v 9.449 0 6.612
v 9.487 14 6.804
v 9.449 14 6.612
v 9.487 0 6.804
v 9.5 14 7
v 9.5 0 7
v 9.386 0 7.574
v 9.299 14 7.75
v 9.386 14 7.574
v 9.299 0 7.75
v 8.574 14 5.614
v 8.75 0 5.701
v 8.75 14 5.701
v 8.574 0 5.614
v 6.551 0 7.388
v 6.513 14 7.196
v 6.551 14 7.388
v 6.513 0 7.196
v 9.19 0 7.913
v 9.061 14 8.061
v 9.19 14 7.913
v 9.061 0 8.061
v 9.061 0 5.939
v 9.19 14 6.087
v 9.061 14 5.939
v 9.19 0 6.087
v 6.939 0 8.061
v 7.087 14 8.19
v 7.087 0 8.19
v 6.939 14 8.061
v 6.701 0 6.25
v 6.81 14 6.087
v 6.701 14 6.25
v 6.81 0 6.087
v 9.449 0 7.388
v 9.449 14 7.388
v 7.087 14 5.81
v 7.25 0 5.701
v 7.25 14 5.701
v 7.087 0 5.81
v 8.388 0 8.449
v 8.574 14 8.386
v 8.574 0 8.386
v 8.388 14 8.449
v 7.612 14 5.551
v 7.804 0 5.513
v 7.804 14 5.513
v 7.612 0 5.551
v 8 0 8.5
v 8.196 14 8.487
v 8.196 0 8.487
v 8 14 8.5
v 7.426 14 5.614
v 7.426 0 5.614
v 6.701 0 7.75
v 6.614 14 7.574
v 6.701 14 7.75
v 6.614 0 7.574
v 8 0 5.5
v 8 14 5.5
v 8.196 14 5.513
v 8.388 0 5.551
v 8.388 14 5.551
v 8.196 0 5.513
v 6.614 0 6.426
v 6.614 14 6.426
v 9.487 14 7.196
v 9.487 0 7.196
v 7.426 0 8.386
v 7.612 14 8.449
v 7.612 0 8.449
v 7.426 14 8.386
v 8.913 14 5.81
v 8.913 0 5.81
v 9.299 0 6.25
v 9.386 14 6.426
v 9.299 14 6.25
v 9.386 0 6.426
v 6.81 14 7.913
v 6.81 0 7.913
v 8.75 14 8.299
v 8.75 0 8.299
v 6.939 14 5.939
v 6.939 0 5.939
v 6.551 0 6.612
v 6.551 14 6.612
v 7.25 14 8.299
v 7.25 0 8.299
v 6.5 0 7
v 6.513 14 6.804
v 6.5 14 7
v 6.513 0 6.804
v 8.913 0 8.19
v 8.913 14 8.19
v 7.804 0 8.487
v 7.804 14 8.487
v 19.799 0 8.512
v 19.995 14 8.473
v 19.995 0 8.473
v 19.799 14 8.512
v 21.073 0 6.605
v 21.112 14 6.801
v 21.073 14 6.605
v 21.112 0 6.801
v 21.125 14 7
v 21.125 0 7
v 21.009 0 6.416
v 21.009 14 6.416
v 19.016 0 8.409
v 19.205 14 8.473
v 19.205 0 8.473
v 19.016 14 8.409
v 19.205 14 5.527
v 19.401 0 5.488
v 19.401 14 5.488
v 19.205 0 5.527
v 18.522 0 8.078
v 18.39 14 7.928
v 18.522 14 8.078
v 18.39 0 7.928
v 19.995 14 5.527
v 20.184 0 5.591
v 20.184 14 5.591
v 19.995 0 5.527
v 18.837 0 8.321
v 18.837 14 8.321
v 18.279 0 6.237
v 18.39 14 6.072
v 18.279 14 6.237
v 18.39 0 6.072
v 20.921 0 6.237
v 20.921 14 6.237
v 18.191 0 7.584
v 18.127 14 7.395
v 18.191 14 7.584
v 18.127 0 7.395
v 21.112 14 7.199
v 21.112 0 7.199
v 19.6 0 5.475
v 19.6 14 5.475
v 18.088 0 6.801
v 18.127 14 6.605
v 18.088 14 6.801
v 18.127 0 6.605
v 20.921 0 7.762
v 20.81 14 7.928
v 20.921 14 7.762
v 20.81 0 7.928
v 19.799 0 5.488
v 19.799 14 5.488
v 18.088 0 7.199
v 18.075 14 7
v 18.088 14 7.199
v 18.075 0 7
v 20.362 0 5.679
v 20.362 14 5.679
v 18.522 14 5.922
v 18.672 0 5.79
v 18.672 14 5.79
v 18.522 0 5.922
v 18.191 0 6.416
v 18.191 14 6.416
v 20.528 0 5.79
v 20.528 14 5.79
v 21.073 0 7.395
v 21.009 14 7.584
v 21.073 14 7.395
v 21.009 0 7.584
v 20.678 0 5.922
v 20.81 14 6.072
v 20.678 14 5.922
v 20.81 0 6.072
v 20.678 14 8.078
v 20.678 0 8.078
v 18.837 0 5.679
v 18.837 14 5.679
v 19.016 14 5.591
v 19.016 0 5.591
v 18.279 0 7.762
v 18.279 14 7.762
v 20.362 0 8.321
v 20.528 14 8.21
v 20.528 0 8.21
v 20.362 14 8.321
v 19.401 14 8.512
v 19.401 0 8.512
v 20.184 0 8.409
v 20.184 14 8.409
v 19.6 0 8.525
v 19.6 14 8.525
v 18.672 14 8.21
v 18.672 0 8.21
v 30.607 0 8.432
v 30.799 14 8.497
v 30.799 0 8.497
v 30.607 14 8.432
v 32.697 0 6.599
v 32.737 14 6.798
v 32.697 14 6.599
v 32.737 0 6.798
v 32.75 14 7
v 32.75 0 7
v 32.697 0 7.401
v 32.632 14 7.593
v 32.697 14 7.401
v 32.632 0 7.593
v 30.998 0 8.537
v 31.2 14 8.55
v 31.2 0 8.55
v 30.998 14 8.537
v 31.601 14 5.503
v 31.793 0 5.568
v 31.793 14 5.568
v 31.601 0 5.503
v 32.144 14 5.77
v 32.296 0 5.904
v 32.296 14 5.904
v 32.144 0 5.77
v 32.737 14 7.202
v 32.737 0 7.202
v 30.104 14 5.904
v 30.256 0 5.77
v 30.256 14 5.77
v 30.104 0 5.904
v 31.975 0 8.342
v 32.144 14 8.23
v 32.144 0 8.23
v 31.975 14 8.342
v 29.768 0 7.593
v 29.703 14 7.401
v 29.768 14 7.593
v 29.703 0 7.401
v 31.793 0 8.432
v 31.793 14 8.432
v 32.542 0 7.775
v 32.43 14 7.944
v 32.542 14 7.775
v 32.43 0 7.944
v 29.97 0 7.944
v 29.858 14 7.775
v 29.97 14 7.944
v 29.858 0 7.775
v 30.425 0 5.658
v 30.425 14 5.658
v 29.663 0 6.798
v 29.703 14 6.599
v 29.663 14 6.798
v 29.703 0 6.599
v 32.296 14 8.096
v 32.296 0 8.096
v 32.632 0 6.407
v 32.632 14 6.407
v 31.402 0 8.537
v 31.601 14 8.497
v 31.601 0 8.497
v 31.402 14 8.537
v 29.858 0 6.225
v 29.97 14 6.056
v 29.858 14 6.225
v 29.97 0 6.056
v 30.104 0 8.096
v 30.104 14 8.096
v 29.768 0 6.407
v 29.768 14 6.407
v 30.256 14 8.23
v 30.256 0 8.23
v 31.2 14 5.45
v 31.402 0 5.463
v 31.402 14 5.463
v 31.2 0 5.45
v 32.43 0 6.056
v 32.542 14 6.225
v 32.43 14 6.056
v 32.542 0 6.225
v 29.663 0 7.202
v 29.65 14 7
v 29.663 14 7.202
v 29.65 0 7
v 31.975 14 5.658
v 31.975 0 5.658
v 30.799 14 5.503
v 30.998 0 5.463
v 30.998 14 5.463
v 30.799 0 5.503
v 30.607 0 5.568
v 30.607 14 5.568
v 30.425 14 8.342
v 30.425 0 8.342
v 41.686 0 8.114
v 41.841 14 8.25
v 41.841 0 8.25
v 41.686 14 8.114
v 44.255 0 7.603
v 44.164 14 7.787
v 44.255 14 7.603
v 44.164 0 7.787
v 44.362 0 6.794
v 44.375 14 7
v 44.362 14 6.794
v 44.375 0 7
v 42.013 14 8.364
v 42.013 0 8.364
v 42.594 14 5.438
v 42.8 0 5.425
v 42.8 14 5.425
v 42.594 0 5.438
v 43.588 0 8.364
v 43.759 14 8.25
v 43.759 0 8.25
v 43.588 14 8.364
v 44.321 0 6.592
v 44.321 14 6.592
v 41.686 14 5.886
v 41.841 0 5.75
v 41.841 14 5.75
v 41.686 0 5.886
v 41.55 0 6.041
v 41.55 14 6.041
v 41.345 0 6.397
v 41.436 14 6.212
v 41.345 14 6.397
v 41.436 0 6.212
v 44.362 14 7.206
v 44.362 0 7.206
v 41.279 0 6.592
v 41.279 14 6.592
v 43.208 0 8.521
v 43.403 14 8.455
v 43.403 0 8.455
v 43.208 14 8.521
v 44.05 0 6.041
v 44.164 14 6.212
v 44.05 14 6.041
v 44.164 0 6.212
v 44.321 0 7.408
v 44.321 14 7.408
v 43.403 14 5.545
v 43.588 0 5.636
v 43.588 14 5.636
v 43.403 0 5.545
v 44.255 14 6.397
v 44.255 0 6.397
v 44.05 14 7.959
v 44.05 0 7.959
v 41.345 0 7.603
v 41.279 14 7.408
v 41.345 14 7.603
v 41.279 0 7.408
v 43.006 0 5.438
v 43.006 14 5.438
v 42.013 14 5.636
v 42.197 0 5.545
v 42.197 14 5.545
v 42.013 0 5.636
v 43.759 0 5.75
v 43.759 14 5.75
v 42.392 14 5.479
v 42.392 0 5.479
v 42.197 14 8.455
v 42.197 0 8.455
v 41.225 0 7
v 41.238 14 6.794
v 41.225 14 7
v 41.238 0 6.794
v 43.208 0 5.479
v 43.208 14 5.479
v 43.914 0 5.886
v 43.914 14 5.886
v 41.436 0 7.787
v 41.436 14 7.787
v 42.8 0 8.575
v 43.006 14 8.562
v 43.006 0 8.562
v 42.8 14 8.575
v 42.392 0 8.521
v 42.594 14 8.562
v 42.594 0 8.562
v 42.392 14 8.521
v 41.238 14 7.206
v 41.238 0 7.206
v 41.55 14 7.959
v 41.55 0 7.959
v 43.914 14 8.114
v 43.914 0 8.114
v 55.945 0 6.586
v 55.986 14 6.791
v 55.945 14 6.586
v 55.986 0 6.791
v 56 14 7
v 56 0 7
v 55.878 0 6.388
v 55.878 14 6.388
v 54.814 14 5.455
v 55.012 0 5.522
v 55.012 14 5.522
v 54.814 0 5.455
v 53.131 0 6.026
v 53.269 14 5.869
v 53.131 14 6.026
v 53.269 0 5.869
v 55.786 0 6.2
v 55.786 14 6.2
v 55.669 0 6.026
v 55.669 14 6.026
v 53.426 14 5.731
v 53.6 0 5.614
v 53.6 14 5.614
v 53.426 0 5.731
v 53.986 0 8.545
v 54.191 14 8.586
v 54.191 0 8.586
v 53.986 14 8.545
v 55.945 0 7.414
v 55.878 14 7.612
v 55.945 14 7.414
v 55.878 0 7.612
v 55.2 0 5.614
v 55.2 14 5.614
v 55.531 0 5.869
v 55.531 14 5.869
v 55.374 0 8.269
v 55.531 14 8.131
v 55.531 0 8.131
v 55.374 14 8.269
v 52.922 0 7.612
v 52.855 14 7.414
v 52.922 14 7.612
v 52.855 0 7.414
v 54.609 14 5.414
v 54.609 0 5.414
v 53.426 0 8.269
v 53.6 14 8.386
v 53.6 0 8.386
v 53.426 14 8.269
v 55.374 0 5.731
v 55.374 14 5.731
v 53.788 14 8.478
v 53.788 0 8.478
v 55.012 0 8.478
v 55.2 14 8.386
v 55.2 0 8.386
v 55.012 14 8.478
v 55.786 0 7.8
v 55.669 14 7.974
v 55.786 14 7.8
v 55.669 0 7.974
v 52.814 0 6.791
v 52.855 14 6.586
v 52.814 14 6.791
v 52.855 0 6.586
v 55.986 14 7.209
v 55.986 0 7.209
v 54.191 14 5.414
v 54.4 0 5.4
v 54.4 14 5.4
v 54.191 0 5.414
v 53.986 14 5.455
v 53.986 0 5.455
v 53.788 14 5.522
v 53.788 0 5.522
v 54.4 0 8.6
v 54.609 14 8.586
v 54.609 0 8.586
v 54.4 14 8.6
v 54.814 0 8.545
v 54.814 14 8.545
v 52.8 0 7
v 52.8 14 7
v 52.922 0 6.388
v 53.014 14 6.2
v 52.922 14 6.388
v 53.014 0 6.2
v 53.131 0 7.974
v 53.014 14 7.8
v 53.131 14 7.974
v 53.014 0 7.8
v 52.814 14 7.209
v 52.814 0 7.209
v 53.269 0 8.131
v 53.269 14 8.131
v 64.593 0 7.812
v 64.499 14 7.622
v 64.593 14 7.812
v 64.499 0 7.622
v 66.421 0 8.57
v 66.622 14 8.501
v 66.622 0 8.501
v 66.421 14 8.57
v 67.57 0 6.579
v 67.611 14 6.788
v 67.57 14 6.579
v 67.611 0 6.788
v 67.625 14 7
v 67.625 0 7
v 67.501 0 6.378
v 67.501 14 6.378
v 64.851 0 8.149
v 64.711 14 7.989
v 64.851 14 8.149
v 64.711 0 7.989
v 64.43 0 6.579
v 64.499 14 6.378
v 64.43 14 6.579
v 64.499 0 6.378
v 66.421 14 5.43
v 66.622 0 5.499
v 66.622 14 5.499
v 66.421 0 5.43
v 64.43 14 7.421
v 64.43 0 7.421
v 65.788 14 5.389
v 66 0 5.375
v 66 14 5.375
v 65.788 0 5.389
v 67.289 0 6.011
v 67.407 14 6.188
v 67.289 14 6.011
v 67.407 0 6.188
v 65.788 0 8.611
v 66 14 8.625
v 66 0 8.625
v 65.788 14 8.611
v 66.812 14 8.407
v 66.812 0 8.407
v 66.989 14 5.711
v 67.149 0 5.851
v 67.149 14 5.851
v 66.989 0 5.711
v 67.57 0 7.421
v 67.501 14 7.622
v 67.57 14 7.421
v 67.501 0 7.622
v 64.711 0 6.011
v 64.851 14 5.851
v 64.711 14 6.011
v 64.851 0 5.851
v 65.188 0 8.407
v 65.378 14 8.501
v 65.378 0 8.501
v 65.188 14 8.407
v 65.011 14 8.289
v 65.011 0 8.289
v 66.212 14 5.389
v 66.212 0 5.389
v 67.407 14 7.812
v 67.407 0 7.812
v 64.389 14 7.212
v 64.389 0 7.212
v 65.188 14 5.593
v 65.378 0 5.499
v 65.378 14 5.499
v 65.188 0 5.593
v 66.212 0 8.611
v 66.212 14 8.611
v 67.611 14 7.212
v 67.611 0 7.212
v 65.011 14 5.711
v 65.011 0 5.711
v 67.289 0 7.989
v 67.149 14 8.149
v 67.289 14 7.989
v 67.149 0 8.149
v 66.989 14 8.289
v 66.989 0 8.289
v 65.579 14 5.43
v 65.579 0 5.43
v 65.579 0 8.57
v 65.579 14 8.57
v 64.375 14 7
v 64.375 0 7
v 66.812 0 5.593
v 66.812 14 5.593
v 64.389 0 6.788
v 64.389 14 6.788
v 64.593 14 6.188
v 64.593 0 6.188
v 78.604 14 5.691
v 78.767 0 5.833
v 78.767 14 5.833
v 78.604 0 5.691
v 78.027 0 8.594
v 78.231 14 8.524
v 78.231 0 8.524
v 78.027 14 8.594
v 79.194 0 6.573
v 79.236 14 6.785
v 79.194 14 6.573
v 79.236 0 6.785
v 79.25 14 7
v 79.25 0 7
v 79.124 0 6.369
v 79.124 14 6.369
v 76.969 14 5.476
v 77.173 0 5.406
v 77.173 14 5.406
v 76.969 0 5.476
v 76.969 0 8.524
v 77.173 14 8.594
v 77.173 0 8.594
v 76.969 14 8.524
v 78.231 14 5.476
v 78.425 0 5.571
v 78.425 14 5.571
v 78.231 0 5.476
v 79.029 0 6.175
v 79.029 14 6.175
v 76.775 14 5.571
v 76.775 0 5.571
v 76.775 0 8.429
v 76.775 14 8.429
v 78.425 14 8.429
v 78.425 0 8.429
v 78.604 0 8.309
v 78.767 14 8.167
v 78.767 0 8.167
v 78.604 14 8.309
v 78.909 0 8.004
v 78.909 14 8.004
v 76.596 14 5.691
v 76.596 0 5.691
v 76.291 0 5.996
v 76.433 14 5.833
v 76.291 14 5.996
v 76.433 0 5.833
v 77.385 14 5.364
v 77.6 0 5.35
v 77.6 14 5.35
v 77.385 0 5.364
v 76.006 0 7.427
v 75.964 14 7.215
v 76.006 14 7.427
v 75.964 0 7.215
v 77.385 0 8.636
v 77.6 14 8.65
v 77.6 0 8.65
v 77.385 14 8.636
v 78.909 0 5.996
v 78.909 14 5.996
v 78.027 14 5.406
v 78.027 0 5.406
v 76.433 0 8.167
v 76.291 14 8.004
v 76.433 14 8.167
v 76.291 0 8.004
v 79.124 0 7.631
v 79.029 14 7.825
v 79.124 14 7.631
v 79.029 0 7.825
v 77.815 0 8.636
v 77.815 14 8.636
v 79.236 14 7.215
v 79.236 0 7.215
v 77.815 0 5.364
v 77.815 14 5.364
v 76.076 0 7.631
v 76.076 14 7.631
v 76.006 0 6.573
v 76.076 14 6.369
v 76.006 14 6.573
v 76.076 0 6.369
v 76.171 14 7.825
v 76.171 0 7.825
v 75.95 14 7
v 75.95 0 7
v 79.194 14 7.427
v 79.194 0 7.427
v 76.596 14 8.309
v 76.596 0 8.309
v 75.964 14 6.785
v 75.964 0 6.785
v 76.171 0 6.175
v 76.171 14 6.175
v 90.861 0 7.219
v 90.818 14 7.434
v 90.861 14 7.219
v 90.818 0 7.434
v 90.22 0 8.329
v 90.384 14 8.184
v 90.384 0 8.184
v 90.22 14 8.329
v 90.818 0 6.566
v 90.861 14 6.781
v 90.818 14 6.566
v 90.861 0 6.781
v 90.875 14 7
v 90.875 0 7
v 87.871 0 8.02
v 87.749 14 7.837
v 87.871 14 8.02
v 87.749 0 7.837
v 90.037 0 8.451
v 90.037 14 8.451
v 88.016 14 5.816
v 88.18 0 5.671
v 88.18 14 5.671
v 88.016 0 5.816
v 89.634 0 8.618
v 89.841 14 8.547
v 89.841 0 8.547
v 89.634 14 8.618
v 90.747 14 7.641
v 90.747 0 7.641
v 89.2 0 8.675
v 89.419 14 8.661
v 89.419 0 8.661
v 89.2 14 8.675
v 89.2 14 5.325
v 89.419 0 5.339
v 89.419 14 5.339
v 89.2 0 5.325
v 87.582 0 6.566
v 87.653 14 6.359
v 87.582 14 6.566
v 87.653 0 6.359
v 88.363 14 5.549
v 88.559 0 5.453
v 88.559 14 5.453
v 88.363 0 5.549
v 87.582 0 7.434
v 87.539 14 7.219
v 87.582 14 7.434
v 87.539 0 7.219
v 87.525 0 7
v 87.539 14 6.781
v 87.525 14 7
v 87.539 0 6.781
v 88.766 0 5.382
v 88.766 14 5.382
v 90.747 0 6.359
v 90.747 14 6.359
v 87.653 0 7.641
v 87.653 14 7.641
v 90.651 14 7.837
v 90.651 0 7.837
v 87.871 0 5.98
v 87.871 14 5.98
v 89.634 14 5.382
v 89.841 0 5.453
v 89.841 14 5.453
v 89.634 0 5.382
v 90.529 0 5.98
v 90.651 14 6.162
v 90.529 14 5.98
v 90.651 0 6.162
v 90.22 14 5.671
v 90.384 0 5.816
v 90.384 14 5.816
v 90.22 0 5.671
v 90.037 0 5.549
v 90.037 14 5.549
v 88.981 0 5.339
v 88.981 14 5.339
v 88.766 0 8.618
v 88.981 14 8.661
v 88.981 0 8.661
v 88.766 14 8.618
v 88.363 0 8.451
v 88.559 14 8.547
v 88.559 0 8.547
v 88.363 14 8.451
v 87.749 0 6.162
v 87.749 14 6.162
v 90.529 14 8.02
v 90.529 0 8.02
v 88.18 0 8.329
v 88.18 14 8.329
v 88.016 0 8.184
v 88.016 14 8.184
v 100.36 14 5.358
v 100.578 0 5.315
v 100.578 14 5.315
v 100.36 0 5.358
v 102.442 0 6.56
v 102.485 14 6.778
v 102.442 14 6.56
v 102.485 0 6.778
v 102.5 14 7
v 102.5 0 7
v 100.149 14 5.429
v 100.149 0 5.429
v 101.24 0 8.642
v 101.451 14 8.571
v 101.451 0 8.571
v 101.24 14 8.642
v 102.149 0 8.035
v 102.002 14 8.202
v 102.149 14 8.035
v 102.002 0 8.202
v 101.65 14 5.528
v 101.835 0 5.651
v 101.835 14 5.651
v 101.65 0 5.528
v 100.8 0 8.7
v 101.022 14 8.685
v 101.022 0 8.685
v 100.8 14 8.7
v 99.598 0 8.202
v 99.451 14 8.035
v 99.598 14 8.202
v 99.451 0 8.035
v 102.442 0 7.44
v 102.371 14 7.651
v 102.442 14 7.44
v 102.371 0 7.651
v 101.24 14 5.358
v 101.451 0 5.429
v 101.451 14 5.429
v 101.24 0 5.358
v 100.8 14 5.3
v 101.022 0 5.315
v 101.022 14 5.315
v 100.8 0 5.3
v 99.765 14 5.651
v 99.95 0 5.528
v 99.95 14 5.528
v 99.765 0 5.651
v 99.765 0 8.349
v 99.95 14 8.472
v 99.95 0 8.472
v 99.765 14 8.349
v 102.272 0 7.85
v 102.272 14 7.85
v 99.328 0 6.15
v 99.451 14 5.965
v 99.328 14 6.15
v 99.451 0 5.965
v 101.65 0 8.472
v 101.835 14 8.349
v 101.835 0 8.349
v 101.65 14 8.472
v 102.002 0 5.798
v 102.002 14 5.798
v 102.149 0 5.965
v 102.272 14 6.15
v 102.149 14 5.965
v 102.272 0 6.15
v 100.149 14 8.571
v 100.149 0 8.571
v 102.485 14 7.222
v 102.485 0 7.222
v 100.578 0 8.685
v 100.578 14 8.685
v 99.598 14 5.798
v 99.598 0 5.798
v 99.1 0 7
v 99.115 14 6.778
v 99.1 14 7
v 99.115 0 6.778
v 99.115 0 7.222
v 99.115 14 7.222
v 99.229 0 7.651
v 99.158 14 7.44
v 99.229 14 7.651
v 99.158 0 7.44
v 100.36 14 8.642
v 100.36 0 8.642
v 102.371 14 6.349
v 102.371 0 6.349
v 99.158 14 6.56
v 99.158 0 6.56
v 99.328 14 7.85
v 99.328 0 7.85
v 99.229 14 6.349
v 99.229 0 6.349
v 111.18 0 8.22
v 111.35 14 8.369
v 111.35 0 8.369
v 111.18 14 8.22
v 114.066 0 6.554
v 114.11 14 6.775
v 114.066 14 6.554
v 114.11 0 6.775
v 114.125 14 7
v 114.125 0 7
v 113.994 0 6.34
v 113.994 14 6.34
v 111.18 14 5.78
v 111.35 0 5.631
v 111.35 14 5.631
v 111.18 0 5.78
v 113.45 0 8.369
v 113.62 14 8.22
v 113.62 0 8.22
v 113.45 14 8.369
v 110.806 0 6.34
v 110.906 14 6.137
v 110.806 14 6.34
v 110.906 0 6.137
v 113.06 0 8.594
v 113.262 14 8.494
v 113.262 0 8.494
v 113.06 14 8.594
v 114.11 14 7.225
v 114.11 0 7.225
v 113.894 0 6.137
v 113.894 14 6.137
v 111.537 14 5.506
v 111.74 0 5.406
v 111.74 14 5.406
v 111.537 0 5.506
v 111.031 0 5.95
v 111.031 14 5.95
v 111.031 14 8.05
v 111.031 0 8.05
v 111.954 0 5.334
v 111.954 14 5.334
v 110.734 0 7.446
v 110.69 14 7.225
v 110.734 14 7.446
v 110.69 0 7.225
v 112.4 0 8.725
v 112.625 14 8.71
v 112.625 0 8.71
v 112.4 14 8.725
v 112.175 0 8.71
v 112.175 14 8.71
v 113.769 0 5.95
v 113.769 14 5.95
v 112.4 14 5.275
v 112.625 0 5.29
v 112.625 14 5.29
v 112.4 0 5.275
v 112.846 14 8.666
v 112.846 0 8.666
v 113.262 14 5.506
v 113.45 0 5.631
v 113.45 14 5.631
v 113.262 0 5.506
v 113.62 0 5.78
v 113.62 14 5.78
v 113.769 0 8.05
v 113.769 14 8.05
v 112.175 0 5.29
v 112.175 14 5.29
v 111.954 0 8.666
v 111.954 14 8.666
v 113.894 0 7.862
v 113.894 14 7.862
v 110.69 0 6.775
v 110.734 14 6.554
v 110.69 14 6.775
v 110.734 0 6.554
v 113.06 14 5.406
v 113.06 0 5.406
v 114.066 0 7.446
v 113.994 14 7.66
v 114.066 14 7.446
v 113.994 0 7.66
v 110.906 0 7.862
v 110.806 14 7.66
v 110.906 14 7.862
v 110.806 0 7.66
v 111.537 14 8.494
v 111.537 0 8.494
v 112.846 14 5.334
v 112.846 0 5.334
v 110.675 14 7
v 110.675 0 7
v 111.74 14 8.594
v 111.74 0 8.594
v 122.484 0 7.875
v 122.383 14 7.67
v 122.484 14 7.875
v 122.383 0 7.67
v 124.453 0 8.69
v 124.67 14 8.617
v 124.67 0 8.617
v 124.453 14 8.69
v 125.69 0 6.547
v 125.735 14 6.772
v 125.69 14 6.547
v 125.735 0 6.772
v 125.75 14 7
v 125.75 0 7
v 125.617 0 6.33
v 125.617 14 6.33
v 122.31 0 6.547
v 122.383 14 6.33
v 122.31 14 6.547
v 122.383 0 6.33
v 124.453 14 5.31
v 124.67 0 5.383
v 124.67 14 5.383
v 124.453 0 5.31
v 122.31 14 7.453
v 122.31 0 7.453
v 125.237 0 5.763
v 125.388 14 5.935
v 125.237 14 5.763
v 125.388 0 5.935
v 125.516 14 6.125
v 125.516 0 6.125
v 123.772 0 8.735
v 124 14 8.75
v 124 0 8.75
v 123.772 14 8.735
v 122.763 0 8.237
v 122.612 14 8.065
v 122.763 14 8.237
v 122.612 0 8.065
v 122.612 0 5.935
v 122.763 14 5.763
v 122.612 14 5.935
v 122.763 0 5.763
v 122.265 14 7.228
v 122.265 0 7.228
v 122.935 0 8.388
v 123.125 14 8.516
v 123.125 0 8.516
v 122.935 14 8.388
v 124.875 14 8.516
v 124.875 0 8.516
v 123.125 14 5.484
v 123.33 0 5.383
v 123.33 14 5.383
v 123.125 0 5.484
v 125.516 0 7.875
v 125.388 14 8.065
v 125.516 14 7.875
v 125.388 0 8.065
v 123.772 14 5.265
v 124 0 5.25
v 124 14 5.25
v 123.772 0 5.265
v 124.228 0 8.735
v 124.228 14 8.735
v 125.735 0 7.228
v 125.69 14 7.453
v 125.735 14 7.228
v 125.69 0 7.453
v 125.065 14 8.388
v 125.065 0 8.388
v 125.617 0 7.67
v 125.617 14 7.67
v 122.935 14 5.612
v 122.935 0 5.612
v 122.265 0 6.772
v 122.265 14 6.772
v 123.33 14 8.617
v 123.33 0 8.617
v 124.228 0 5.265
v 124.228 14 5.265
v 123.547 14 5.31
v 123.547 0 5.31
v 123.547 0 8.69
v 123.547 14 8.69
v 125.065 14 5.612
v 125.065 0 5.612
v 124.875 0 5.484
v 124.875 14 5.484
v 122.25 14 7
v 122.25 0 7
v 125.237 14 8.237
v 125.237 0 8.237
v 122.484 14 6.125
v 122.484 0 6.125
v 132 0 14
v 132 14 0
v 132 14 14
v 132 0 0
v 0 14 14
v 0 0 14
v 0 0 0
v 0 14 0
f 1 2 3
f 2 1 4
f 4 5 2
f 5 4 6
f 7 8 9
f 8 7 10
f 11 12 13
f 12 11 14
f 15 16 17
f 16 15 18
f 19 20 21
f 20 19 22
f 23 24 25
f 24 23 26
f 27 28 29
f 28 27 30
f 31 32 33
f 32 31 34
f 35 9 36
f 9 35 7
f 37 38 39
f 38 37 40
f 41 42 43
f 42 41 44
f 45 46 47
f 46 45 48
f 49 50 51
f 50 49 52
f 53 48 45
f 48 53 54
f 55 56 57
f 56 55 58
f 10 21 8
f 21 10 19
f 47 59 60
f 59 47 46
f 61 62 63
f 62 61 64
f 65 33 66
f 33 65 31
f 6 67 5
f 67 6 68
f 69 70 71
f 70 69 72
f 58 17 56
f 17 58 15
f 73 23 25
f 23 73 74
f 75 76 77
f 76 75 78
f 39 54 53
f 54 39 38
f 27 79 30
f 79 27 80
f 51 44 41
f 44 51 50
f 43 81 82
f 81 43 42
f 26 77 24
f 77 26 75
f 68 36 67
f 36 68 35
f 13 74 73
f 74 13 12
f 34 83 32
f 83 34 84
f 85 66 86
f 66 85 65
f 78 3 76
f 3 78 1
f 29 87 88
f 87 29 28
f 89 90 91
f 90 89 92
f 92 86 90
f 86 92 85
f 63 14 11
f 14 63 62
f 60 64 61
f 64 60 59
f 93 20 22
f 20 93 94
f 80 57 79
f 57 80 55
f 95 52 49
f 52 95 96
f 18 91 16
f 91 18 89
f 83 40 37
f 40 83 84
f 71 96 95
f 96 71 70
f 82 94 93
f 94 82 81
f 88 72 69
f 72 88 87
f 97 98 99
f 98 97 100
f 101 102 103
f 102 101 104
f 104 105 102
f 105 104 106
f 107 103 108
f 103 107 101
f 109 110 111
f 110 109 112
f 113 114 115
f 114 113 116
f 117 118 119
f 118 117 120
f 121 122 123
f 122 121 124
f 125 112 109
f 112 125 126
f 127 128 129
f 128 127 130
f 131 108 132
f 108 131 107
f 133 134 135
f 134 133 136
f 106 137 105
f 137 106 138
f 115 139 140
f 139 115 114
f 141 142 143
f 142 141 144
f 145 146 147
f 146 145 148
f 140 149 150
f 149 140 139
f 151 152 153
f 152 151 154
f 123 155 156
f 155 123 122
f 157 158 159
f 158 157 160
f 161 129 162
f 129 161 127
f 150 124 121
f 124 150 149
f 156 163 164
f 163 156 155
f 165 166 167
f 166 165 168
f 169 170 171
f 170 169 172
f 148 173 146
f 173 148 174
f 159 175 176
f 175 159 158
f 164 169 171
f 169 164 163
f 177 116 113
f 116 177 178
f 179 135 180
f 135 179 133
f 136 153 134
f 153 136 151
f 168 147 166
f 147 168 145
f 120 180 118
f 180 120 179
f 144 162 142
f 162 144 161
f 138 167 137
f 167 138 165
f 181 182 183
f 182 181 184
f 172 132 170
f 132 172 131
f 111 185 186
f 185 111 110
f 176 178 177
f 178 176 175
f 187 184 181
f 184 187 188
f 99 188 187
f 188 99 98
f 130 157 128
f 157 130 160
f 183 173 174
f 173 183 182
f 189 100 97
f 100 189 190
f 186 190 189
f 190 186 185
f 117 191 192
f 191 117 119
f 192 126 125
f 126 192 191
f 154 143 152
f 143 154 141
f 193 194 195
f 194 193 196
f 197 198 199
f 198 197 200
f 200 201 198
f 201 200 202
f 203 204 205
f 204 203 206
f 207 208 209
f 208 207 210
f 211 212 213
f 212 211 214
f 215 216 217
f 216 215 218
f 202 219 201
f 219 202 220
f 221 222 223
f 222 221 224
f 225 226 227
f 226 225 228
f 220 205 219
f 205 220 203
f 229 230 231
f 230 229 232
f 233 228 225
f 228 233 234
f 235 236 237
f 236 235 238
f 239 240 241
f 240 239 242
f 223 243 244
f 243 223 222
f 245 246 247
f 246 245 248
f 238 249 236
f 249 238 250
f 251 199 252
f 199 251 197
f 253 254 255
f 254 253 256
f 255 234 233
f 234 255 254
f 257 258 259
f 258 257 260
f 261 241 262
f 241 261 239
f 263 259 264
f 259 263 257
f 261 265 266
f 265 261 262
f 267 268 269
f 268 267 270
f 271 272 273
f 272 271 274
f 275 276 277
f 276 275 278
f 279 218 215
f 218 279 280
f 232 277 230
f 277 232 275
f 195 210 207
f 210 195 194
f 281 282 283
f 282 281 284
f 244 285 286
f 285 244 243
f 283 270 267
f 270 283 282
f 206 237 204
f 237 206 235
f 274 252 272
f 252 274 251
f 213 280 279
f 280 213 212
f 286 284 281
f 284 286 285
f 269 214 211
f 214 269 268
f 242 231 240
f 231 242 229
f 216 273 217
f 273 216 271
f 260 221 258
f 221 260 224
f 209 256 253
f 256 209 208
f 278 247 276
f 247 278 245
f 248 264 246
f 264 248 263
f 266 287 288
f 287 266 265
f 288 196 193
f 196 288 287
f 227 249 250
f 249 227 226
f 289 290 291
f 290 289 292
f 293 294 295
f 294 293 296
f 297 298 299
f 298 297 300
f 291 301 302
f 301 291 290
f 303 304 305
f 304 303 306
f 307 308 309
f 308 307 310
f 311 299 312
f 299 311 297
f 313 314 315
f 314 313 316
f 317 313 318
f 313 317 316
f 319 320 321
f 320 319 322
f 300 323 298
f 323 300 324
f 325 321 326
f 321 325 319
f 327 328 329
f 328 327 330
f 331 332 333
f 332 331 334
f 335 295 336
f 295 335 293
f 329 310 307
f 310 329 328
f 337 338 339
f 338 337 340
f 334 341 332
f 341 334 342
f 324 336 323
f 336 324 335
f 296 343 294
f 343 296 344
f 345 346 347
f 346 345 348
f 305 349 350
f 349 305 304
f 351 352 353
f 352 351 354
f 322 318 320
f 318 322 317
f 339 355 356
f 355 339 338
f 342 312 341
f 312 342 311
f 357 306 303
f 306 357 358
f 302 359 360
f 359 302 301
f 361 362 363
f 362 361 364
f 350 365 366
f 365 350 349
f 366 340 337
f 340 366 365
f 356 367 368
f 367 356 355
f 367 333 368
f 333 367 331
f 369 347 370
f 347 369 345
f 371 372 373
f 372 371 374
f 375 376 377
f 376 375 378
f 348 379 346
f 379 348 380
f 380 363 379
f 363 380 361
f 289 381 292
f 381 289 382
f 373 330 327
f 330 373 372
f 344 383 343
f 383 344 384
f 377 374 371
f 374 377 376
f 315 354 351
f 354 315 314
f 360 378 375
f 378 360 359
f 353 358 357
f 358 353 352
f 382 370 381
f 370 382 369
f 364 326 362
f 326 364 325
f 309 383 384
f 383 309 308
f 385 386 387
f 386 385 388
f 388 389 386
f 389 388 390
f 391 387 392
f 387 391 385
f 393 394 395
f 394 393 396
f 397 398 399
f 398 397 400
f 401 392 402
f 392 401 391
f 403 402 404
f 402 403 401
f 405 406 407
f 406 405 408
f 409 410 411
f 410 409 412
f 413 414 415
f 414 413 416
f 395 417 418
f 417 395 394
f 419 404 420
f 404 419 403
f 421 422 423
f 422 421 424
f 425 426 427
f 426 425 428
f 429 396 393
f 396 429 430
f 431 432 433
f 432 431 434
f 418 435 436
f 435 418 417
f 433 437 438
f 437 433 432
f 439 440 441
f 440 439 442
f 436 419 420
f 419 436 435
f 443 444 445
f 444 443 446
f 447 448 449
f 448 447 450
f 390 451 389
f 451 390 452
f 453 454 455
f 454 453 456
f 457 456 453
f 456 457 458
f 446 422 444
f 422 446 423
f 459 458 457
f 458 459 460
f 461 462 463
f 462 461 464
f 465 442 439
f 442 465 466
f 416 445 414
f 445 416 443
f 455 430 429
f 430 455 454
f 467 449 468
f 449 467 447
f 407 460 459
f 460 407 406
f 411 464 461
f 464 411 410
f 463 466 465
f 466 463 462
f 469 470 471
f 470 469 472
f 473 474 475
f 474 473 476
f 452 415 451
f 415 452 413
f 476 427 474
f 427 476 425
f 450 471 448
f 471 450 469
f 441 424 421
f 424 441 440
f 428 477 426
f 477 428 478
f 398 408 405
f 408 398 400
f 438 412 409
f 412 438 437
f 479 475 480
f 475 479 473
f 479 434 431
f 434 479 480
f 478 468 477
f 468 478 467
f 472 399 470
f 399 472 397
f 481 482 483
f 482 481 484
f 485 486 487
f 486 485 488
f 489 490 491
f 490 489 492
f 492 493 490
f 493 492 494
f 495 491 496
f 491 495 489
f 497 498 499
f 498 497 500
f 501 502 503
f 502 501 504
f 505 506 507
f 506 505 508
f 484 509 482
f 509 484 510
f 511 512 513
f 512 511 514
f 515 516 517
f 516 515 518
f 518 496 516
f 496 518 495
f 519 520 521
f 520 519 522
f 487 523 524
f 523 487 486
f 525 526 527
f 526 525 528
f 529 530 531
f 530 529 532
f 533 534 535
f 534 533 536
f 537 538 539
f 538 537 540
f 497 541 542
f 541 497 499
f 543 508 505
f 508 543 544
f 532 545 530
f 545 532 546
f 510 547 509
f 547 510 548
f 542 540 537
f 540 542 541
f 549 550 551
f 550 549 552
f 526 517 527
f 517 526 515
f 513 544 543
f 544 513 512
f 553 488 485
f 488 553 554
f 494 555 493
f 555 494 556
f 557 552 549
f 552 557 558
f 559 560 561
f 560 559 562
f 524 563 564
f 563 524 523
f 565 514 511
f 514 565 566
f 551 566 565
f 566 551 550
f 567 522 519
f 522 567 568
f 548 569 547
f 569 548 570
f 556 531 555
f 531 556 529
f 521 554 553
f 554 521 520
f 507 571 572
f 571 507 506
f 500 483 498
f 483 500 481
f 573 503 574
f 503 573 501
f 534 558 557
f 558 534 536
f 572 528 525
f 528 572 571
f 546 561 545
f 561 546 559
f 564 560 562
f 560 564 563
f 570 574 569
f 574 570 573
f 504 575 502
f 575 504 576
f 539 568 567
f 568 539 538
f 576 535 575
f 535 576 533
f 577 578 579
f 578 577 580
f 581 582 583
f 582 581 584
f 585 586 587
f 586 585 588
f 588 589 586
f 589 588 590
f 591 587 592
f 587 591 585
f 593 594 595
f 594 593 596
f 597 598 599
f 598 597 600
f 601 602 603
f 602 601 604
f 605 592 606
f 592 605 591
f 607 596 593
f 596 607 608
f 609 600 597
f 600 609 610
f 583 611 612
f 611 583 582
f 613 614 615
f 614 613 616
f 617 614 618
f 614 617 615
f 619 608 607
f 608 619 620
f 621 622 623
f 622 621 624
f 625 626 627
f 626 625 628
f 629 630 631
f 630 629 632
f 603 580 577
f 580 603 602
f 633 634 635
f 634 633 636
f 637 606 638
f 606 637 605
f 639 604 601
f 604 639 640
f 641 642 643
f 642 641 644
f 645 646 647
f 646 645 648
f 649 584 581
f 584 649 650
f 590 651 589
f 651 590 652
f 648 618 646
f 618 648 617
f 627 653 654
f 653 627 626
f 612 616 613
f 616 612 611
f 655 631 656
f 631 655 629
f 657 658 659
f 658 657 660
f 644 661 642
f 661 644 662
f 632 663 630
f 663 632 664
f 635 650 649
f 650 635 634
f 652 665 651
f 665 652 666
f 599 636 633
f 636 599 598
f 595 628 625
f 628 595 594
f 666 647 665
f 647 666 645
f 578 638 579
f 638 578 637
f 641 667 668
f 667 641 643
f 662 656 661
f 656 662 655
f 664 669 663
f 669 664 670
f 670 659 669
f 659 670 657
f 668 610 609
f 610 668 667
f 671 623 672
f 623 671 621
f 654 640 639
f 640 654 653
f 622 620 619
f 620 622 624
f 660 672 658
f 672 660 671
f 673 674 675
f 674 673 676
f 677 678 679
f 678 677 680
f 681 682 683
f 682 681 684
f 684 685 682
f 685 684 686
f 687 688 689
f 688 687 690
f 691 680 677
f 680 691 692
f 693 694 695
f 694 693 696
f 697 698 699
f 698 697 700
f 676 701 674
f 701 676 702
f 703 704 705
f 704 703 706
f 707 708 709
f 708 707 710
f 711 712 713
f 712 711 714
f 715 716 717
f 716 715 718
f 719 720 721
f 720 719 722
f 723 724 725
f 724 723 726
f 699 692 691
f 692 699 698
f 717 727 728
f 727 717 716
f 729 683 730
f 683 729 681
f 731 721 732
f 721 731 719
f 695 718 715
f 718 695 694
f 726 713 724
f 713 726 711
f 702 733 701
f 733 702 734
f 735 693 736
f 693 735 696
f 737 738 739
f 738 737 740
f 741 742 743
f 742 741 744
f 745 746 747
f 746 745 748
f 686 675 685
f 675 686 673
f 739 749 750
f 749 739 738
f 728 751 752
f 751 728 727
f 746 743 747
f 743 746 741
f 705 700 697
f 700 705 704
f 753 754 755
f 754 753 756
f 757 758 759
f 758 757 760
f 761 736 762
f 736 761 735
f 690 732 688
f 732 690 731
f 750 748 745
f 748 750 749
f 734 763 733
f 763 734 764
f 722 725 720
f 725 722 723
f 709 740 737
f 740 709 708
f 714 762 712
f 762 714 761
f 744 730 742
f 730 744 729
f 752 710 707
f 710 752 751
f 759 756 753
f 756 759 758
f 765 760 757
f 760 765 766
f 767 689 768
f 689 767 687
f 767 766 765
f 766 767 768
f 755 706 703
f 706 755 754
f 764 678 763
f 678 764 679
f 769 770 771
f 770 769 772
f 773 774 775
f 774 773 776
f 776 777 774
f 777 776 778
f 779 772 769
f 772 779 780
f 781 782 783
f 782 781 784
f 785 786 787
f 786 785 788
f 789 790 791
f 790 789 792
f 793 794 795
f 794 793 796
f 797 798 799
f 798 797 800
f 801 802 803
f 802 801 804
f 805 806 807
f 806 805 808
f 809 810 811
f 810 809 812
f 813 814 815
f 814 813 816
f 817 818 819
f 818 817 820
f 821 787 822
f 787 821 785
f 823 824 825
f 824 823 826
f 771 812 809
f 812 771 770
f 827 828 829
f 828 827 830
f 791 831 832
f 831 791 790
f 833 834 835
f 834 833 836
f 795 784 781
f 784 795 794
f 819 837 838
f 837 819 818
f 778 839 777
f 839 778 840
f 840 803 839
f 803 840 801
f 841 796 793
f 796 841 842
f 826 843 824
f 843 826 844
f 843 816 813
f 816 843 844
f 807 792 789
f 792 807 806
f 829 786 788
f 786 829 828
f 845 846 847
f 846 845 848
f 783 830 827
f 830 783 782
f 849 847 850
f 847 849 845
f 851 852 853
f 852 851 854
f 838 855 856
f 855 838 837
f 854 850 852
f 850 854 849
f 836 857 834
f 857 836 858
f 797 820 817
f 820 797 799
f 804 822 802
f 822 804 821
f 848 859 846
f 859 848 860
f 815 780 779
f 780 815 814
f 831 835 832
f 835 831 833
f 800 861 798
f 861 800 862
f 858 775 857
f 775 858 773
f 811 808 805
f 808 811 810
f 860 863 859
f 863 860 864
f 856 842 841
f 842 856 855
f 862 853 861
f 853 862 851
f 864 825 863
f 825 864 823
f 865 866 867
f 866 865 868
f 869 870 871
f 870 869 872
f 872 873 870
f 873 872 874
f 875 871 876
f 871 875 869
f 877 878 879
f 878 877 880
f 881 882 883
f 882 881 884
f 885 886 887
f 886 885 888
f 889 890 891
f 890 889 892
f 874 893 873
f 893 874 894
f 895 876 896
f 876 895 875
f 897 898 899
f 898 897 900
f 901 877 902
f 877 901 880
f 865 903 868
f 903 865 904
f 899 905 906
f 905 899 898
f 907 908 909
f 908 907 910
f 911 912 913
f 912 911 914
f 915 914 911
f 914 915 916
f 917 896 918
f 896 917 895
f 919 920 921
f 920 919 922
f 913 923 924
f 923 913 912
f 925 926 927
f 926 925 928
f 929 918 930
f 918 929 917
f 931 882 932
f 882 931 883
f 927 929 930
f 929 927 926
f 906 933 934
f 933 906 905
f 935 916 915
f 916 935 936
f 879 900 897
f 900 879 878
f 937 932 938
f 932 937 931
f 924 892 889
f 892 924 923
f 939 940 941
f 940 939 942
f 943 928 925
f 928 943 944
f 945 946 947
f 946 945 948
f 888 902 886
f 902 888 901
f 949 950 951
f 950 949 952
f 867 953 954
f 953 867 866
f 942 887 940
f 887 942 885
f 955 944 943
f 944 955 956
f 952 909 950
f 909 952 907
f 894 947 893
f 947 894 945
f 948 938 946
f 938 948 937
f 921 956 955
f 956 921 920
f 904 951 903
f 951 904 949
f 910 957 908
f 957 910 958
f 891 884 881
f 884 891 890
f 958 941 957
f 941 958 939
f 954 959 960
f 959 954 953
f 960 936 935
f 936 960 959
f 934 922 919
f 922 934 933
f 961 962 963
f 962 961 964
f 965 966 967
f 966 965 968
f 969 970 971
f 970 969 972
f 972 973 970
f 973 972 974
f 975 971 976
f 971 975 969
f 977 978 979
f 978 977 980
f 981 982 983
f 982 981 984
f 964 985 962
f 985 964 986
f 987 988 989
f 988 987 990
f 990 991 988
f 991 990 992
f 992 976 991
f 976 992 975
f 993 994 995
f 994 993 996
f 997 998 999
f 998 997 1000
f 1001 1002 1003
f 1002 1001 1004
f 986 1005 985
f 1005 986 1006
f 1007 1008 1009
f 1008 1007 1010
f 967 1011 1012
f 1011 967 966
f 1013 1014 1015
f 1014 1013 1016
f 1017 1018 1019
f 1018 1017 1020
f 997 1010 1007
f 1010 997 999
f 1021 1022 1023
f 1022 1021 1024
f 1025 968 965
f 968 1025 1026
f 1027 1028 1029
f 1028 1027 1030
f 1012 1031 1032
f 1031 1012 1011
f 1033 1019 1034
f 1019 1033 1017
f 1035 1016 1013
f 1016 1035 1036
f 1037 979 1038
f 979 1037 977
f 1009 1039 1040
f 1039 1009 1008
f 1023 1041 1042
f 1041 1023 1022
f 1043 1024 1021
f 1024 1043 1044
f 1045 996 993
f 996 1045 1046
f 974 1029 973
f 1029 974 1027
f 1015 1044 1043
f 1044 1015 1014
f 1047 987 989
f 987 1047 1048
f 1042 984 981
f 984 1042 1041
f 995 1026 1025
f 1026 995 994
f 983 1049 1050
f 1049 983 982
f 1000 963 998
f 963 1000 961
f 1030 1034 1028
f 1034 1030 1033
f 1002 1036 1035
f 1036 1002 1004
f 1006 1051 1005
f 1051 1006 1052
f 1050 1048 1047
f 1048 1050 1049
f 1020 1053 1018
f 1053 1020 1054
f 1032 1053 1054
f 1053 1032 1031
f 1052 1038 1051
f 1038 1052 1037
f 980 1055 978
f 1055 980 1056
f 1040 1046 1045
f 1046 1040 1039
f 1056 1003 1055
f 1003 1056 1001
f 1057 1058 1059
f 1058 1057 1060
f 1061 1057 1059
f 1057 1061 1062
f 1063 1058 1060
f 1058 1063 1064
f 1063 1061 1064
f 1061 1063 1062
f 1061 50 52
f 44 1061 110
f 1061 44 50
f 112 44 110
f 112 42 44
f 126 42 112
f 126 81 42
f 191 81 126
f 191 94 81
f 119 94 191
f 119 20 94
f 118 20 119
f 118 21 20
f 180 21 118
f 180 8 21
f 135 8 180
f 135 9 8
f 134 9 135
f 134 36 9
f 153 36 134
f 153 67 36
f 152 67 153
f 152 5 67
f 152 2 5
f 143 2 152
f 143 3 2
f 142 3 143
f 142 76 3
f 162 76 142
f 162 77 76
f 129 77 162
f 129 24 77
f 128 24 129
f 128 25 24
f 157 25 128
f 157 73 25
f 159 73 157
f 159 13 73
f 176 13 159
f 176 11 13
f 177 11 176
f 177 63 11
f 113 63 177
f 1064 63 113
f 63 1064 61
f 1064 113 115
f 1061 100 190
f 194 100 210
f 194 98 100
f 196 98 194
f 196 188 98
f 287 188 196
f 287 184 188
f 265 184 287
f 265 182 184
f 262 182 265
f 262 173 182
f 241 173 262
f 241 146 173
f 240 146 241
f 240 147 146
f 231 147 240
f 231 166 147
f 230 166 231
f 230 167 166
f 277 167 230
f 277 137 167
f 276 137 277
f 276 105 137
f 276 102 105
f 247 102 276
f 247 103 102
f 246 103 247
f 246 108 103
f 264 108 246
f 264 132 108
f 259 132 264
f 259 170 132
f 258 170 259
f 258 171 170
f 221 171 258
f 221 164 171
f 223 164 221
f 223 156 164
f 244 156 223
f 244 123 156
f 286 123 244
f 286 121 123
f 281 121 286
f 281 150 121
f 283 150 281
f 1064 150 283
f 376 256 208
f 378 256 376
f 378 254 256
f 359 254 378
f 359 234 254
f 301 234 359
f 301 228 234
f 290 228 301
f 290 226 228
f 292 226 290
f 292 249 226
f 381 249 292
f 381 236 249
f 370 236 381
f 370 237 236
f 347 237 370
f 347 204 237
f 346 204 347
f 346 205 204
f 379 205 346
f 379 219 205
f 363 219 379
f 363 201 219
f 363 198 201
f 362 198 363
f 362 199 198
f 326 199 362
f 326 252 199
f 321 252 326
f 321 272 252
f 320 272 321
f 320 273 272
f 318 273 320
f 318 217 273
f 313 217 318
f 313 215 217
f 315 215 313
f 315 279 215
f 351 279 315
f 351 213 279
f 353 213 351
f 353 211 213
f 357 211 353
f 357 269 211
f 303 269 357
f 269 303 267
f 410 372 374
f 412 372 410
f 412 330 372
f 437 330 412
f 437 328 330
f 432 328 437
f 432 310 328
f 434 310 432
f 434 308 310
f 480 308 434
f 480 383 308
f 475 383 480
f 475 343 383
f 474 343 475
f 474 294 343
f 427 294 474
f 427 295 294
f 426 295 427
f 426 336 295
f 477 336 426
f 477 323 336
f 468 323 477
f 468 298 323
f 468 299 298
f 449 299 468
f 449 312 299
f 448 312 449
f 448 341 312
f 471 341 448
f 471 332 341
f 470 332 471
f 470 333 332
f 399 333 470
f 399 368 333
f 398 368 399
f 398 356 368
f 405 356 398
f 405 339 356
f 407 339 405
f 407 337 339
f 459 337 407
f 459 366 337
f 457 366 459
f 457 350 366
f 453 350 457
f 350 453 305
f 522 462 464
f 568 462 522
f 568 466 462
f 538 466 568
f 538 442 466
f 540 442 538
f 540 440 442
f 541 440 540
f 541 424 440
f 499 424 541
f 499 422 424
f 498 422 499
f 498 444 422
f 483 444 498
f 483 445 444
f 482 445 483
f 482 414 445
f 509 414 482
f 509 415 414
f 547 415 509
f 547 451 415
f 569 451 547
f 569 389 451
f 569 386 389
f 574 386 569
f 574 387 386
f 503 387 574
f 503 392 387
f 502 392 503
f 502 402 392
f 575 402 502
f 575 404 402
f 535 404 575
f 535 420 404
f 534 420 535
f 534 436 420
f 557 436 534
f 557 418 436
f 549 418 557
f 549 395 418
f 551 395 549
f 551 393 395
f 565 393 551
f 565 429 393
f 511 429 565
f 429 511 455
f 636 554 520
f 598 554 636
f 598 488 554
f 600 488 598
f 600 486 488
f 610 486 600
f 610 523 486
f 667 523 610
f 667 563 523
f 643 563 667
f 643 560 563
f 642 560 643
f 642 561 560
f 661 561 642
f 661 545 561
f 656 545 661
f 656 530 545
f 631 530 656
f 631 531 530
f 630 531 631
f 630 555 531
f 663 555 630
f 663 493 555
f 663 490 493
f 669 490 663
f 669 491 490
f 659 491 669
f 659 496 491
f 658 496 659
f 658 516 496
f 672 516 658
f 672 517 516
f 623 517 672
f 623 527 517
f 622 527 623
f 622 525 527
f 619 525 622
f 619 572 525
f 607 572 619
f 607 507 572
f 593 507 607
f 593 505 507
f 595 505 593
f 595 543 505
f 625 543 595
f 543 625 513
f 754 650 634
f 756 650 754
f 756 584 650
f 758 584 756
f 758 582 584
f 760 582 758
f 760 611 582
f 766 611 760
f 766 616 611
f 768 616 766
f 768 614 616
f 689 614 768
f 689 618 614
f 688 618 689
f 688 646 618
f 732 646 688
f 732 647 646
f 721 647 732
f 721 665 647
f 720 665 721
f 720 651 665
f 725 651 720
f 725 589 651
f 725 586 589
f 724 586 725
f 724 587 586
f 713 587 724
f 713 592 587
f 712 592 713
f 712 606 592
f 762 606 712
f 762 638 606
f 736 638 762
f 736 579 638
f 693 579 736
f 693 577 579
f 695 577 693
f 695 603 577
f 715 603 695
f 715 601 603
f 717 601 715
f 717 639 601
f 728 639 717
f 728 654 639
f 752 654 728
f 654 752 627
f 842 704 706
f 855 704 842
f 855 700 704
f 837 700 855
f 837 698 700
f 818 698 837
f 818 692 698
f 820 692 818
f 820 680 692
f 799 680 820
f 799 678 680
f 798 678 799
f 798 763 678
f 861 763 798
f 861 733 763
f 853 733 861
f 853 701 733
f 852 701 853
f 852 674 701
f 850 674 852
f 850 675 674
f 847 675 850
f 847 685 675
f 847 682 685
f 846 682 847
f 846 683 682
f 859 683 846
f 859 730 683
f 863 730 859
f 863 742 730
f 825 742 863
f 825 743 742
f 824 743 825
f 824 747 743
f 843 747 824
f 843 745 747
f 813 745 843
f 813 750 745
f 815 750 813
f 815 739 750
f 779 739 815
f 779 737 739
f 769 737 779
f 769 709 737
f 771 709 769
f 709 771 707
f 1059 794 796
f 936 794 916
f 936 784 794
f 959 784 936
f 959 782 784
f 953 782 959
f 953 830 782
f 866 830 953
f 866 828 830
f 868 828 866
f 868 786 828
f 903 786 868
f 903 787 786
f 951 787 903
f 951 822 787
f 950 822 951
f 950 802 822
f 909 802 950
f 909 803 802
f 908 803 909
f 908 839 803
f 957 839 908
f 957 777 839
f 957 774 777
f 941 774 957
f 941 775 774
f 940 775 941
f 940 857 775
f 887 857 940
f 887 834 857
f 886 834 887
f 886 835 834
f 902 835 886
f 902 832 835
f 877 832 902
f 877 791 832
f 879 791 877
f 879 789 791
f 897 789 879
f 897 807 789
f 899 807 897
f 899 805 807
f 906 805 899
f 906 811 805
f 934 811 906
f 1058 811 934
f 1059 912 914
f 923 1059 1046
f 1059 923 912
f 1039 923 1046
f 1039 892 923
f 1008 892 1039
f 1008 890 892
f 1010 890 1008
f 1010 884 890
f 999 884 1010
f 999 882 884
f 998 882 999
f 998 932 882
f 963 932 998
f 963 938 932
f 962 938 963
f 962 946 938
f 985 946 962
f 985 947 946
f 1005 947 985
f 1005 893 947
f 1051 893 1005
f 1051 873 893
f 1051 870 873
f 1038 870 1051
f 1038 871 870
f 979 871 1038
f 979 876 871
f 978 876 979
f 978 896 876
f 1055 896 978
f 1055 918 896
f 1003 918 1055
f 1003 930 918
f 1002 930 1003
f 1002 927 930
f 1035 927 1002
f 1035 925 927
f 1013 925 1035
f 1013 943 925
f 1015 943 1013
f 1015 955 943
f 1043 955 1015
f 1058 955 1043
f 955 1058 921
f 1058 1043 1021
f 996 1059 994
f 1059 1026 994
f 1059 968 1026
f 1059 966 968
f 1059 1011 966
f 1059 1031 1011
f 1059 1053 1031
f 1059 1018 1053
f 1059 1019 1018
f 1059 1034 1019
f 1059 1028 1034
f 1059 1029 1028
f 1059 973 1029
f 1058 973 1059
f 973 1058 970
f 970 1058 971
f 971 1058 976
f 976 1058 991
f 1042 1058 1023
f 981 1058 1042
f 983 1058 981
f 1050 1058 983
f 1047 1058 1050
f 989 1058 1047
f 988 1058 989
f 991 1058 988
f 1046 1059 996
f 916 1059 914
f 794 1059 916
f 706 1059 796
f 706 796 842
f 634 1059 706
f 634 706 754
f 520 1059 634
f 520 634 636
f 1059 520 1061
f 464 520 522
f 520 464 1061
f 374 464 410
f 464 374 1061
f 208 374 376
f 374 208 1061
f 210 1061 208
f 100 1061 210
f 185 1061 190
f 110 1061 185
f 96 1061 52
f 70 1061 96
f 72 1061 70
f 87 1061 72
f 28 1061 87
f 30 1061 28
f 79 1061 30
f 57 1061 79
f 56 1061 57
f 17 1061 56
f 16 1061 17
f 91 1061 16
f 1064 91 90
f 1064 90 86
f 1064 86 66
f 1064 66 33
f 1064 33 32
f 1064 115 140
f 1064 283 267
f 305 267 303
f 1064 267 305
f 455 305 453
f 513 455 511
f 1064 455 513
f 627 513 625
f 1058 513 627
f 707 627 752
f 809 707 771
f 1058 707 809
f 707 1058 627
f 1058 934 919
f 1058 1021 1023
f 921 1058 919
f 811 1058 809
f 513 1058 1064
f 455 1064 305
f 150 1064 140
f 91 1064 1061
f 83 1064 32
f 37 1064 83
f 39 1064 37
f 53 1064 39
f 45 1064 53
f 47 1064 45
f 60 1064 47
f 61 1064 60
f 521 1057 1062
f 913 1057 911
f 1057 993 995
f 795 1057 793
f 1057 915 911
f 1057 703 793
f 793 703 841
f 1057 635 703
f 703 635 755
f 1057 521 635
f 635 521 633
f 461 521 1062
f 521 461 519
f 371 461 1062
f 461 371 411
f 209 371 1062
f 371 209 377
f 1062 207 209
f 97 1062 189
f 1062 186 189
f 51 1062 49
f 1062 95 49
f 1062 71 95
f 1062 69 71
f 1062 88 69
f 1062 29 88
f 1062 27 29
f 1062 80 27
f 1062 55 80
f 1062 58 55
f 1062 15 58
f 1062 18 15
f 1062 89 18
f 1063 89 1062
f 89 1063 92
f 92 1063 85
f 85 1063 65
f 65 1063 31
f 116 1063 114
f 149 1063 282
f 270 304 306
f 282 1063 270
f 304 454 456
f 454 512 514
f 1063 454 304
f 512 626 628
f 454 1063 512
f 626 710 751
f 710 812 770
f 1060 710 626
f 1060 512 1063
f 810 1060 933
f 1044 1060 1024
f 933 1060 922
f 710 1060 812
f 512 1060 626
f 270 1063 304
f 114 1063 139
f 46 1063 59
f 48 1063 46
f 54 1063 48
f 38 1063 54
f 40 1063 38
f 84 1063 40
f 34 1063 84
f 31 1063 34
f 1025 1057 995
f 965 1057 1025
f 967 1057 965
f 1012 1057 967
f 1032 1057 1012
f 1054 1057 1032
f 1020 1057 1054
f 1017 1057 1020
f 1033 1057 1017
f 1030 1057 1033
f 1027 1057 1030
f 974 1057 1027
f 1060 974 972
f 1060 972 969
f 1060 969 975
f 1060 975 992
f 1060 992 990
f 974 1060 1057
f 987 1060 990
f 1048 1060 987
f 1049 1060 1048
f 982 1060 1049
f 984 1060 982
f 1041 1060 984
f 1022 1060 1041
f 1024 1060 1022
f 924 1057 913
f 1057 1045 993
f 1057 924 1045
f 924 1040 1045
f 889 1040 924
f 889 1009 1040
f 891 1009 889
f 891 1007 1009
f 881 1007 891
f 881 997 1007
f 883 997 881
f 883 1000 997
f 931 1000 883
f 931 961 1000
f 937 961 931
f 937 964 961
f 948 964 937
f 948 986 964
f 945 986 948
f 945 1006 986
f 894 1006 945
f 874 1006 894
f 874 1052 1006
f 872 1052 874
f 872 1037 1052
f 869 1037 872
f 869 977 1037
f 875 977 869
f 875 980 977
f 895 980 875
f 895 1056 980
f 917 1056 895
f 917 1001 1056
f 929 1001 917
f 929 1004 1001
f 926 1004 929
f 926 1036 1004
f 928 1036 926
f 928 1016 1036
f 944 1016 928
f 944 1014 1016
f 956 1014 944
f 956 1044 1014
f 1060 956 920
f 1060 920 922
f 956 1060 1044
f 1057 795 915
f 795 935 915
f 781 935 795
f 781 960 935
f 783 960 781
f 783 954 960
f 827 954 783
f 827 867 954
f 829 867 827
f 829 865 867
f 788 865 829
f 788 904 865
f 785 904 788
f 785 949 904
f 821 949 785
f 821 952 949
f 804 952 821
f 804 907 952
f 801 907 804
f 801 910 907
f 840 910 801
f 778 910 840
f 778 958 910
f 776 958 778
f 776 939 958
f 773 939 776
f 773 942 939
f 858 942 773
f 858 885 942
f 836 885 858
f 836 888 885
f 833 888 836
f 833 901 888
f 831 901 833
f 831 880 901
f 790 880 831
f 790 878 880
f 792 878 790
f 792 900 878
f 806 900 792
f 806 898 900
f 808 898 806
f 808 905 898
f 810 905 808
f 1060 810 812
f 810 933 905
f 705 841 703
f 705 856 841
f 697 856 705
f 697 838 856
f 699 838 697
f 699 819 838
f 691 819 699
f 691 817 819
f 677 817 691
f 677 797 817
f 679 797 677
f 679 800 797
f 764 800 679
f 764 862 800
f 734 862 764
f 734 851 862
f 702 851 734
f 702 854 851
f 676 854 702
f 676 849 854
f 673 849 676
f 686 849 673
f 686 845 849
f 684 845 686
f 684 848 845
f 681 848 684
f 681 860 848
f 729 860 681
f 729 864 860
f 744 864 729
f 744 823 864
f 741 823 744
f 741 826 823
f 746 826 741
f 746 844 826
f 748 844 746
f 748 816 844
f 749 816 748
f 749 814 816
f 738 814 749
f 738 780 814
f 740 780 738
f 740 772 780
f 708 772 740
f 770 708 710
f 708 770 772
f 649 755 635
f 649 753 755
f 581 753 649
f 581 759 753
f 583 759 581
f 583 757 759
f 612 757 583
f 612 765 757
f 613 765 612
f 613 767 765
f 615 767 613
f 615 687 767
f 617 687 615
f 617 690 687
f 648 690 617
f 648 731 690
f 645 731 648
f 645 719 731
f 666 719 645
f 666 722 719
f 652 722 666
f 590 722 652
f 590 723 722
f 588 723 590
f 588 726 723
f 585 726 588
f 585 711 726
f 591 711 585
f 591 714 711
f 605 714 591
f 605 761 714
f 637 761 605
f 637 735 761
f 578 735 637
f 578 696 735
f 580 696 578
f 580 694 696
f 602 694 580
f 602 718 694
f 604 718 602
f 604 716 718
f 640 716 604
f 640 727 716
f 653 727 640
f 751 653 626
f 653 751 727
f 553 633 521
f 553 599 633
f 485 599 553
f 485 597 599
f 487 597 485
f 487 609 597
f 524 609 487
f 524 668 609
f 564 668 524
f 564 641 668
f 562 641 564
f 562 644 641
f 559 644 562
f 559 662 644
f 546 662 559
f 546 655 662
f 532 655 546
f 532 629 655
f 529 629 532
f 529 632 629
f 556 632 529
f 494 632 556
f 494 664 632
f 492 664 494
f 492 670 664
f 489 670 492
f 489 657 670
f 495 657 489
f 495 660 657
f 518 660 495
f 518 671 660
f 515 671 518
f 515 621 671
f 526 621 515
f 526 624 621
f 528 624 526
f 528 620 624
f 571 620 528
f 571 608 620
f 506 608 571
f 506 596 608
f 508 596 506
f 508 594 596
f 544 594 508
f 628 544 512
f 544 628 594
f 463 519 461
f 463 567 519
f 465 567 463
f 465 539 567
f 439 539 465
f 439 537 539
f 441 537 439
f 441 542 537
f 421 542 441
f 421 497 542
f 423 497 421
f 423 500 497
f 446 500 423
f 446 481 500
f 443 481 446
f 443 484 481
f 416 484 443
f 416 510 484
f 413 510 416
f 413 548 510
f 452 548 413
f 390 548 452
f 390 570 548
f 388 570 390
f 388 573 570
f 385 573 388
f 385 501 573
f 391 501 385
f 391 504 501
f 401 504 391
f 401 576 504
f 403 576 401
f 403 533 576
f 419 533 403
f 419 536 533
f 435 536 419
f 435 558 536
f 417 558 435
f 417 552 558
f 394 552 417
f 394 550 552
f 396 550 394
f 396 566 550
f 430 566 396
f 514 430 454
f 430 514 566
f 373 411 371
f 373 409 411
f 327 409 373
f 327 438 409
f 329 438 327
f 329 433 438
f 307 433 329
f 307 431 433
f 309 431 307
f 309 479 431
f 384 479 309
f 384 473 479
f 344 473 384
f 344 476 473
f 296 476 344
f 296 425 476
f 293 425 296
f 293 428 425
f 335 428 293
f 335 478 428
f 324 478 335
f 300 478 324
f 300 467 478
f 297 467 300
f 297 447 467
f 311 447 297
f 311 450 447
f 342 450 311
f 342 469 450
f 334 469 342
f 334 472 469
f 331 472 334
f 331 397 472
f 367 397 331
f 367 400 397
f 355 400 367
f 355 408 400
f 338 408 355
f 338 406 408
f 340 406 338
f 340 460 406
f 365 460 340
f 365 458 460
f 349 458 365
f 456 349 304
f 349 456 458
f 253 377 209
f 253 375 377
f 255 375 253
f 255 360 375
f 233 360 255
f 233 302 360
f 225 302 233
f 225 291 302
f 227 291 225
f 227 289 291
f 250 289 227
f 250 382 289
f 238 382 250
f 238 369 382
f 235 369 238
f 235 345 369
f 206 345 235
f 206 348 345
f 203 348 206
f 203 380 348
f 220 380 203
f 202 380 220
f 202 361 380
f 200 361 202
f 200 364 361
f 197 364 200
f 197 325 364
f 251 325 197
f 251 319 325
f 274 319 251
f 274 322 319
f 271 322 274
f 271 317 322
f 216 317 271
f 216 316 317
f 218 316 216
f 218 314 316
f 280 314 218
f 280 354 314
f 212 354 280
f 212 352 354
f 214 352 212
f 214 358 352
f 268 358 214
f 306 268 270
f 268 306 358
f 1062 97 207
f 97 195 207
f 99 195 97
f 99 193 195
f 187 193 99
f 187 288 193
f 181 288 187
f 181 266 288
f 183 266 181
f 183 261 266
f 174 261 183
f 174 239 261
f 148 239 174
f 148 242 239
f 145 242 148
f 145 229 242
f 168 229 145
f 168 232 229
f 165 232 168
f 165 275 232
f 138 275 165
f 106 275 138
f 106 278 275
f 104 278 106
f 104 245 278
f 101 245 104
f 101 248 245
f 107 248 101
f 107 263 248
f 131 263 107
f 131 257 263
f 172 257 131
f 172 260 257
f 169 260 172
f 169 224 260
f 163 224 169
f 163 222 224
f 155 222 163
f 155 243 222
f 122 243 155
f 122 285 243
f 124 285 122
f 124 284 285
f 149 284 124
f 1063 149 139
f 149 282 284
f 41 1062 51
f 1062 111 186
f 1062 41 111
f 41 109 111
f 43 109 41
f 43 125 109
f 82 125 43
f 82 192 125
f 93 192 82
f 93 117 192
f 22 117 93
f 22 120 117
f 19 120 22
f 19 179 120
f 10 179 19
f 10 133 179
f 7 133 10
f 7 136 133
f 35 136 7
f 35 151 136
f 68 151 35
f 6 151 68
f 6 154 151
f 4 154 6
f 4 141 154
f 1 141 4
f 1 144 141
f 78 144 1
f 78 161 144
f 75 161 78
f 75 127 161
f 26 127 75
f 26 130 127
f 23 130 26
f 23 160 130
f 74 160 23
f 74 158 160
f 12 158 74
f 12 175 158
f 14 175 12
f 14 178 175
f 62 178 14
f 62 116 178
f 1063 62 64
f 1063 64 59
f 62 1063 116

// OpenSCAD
/*
Blocksmith horizontal pin-fit coupon v0.1
11 holes: 3.00 mm through 3.50 mm in 0.05 mm steps.
Print flat in the displayed orientation with no supports.
This source requires an OpenSCAD render before STL export.
*/
$fn = 48;
hole_sizes = [3.00, 3.05, 3.10, 3.15, 3.20, 3.25, 3.30, 3.35, 3.40, 3.45, 3.50];
coupon_length = 132;
coupon_depth = 14;
coupon_height = 14;

difference() {
  cube([coupon_length, coupon_depth, coupon_height]);
  for (i = [0 : len(hole_sizes) - 1]) {
    translate([8 + i * 11.6, -1, coupon_height / 2])
      rotate([-90, 0, 0])
        cylinder(h = coupon_depth + 2, d = hole_sizes[i]);
  }
}
